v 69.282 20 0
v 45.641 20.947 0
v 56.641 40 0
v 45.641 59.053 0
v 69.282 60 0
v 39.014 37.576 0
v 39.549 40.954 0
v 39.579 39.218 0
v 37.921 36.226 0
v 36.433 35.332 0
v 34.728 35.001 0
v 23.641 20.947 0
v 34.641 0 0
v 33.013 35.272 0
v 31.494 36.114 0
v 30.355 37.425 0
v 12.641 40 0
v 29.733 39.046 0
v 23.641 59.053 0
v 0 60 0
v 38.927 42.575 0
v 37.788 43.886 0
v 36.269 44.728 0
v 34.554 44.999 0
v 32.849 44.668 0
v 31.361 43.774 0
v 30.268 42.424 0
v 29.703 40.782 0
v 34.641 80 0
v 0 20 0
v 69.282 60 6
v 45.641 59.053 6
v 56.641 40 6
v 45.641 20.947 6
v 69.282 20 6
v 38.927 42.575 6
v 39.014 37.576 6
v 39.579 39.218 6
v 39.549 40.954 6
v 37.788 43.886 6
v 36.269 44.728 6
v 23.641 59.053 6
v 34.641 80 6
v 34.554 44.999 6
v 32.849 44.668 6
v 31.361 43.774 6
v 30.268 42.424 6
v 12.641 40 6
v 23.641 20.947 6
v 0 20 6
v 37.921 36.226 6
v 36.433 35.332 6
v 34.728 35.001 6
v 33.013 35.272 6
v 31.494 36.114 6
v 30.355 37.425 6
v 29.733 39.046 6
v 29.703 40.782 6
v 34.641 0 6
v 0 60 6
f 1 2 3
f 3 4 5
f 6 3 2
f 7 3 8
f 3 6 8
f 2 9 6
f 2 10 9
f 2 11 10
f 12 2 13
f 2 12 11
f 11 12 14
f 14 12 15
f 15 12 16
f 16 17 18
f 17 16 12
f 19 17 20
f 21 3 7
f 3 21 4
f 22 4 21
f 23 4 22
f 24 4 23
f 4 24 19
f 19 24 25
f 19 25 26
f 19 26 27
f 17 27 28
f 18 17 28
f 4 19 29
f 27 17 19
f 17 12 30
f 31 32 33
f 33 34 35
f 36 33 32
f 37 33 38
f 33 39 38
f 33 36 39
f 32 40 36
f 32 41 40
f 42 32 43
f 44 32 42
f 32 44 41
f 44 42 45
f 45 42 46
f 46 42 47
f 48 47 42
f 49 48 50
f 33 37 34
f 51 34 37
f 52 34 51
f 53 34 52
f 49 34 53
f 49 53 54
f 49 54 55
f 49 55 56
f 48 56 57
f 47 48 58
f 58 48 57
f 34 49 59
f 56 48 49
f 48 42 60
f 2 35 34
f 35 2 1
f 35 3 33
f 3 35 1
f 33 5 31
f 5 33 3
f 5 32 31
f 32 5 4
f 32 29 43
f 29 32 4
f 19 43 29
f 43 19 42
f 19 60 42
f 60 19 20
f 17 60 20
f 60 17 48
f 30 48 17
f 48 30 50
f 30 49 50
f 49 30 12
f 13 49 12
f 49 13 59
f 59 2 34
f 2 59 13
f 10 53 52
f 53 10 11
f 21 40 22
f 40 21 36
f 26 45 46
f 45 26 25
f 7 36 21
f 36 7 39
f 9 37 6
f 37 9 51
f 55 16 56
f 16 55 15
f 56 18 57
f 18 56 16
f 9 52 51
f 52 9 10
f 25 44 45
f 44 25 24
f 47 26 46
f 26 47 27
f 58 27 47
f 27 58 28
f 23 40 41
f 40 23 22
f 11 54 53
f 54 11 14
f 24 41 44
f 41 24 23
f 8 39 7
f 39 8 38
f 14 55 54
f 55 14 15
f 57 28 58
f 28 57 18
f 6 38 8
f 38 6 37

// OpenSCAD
$fn = 32;

// ----------------------------------------------------------------------
// Star wheel: 6-point star, R40
// ----------------------------------------------------------------------

// --- parameters (mm) ---
n_points = 6;             // number of points / teeth
r_out = 40;               // tip radius
r_in = 22;                // root radius
bore_r = 5;               // centre bore radius
plate_t = 6;              // plate thickness, Z (extrusion height)
bore_d = 10;              // centre bore diameter

profile = [[34.641, 80], [23.641, 59.053], [0, 60], [12.641, 40], [0, 20], [23.641, 20.947], [34.641, 0], [45.641, 20.947], [69.282, 20], [56.641, 40], [69.282, 60], [45.641, 59.053]];  // primary outline, 12 points, counter clockwise
void_1 = [[39.549, 40.954], [38.927, 42.575], [37.788, 43.886], [36.269, 44.728], [34.554, 44.999], [32.849, 44.668], [31.361, 43.774], [30.268, 42.424], [29.703, 40.782], [29.733, 39.046], [30.355, 37.425], [31.494, 36.114], [33.013, 35.272], [34.728, 35.001], [36.433, 35.332], [37.921, 36.226], [39.014, 37.576], [39.579, 39.218]];  // centre bore, 18 points

// --- the one profile operation ---
difference() {
  linear_extrude(height = plate_t) polygon(points = profile);
  translate([0, 0, -1])
    linear_extrude(height = plate_t + 2) polygon(points = void_1);
}
